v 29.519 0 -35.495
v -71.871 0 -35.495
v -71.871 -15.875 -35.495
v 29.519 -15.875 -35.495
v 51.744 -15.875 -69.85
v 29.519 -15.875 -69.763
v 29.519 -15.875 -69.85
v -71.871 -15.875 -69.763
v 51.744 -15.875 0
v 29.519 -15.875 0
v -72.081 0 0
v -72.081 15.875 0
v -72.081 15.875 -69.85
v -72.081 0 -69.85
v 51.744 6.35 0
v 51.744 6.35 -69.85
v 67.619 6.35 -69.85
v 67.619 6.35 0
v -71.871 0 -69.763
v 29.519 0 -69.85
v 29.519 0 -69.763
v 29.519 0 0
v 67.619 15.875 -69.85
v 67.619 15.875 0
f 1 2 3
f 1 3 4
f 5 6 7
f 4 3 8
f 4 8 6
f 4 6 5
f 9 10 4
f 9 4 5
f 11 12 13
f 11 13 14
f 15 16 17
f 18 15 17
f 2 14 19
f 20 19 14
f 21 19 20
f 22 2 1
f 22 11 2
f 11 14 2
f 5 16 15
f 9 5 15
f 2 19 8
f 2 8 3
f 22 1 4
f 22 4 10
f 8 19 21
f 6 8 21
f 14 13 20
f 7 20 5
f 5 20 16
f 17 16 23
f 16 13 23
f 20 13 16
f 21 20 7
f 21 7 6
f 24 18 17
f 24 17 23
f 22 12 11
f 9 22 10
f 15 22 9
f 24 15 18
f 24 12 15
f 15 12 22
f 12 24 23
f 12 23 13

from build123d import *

# Parameters (mm, degrees)
F1_DEPTH = 69.85
F2_W     = 101.6
F2_H     = 34.268197
F3_DEPTH = 15.875
F4_W     = 22.225
F4_H     = 69.85
F5_DEPTH = 22.225


with BuildPart() as f1:
    # F0 (on Top) → F1 (new body)
    with BuildSketch(Plane.XY):
        Polygon((67.618918, 15.875), (-72.081082, 15.875), (-72.081082, 0), (23.168918, 0), (29.518918, 0), (29.518918, 6.35), (51.743918, 6.35), (67.618918, 6.35), align=None)
    extrude(amount=-F1_DEPTH)

    # F2 (on Front) → F3 (join)
    with BuildSketch(Plane.XZ):
        with Locations((-21.070717, -52.628895)):
            Rectangle(F2_W, F2_H)
    extrude(amount=F3_DEPTH)

    # F4 (on face) → F5 (join)
    with BuildSketch(Plane.XZ.offset(-6.35)):
        with Locations((40.631418, -34.925)):
            Rectangle(F4_W, F4_H)
    extrude(amount=F5_DEPTH)


solid = f1.part
